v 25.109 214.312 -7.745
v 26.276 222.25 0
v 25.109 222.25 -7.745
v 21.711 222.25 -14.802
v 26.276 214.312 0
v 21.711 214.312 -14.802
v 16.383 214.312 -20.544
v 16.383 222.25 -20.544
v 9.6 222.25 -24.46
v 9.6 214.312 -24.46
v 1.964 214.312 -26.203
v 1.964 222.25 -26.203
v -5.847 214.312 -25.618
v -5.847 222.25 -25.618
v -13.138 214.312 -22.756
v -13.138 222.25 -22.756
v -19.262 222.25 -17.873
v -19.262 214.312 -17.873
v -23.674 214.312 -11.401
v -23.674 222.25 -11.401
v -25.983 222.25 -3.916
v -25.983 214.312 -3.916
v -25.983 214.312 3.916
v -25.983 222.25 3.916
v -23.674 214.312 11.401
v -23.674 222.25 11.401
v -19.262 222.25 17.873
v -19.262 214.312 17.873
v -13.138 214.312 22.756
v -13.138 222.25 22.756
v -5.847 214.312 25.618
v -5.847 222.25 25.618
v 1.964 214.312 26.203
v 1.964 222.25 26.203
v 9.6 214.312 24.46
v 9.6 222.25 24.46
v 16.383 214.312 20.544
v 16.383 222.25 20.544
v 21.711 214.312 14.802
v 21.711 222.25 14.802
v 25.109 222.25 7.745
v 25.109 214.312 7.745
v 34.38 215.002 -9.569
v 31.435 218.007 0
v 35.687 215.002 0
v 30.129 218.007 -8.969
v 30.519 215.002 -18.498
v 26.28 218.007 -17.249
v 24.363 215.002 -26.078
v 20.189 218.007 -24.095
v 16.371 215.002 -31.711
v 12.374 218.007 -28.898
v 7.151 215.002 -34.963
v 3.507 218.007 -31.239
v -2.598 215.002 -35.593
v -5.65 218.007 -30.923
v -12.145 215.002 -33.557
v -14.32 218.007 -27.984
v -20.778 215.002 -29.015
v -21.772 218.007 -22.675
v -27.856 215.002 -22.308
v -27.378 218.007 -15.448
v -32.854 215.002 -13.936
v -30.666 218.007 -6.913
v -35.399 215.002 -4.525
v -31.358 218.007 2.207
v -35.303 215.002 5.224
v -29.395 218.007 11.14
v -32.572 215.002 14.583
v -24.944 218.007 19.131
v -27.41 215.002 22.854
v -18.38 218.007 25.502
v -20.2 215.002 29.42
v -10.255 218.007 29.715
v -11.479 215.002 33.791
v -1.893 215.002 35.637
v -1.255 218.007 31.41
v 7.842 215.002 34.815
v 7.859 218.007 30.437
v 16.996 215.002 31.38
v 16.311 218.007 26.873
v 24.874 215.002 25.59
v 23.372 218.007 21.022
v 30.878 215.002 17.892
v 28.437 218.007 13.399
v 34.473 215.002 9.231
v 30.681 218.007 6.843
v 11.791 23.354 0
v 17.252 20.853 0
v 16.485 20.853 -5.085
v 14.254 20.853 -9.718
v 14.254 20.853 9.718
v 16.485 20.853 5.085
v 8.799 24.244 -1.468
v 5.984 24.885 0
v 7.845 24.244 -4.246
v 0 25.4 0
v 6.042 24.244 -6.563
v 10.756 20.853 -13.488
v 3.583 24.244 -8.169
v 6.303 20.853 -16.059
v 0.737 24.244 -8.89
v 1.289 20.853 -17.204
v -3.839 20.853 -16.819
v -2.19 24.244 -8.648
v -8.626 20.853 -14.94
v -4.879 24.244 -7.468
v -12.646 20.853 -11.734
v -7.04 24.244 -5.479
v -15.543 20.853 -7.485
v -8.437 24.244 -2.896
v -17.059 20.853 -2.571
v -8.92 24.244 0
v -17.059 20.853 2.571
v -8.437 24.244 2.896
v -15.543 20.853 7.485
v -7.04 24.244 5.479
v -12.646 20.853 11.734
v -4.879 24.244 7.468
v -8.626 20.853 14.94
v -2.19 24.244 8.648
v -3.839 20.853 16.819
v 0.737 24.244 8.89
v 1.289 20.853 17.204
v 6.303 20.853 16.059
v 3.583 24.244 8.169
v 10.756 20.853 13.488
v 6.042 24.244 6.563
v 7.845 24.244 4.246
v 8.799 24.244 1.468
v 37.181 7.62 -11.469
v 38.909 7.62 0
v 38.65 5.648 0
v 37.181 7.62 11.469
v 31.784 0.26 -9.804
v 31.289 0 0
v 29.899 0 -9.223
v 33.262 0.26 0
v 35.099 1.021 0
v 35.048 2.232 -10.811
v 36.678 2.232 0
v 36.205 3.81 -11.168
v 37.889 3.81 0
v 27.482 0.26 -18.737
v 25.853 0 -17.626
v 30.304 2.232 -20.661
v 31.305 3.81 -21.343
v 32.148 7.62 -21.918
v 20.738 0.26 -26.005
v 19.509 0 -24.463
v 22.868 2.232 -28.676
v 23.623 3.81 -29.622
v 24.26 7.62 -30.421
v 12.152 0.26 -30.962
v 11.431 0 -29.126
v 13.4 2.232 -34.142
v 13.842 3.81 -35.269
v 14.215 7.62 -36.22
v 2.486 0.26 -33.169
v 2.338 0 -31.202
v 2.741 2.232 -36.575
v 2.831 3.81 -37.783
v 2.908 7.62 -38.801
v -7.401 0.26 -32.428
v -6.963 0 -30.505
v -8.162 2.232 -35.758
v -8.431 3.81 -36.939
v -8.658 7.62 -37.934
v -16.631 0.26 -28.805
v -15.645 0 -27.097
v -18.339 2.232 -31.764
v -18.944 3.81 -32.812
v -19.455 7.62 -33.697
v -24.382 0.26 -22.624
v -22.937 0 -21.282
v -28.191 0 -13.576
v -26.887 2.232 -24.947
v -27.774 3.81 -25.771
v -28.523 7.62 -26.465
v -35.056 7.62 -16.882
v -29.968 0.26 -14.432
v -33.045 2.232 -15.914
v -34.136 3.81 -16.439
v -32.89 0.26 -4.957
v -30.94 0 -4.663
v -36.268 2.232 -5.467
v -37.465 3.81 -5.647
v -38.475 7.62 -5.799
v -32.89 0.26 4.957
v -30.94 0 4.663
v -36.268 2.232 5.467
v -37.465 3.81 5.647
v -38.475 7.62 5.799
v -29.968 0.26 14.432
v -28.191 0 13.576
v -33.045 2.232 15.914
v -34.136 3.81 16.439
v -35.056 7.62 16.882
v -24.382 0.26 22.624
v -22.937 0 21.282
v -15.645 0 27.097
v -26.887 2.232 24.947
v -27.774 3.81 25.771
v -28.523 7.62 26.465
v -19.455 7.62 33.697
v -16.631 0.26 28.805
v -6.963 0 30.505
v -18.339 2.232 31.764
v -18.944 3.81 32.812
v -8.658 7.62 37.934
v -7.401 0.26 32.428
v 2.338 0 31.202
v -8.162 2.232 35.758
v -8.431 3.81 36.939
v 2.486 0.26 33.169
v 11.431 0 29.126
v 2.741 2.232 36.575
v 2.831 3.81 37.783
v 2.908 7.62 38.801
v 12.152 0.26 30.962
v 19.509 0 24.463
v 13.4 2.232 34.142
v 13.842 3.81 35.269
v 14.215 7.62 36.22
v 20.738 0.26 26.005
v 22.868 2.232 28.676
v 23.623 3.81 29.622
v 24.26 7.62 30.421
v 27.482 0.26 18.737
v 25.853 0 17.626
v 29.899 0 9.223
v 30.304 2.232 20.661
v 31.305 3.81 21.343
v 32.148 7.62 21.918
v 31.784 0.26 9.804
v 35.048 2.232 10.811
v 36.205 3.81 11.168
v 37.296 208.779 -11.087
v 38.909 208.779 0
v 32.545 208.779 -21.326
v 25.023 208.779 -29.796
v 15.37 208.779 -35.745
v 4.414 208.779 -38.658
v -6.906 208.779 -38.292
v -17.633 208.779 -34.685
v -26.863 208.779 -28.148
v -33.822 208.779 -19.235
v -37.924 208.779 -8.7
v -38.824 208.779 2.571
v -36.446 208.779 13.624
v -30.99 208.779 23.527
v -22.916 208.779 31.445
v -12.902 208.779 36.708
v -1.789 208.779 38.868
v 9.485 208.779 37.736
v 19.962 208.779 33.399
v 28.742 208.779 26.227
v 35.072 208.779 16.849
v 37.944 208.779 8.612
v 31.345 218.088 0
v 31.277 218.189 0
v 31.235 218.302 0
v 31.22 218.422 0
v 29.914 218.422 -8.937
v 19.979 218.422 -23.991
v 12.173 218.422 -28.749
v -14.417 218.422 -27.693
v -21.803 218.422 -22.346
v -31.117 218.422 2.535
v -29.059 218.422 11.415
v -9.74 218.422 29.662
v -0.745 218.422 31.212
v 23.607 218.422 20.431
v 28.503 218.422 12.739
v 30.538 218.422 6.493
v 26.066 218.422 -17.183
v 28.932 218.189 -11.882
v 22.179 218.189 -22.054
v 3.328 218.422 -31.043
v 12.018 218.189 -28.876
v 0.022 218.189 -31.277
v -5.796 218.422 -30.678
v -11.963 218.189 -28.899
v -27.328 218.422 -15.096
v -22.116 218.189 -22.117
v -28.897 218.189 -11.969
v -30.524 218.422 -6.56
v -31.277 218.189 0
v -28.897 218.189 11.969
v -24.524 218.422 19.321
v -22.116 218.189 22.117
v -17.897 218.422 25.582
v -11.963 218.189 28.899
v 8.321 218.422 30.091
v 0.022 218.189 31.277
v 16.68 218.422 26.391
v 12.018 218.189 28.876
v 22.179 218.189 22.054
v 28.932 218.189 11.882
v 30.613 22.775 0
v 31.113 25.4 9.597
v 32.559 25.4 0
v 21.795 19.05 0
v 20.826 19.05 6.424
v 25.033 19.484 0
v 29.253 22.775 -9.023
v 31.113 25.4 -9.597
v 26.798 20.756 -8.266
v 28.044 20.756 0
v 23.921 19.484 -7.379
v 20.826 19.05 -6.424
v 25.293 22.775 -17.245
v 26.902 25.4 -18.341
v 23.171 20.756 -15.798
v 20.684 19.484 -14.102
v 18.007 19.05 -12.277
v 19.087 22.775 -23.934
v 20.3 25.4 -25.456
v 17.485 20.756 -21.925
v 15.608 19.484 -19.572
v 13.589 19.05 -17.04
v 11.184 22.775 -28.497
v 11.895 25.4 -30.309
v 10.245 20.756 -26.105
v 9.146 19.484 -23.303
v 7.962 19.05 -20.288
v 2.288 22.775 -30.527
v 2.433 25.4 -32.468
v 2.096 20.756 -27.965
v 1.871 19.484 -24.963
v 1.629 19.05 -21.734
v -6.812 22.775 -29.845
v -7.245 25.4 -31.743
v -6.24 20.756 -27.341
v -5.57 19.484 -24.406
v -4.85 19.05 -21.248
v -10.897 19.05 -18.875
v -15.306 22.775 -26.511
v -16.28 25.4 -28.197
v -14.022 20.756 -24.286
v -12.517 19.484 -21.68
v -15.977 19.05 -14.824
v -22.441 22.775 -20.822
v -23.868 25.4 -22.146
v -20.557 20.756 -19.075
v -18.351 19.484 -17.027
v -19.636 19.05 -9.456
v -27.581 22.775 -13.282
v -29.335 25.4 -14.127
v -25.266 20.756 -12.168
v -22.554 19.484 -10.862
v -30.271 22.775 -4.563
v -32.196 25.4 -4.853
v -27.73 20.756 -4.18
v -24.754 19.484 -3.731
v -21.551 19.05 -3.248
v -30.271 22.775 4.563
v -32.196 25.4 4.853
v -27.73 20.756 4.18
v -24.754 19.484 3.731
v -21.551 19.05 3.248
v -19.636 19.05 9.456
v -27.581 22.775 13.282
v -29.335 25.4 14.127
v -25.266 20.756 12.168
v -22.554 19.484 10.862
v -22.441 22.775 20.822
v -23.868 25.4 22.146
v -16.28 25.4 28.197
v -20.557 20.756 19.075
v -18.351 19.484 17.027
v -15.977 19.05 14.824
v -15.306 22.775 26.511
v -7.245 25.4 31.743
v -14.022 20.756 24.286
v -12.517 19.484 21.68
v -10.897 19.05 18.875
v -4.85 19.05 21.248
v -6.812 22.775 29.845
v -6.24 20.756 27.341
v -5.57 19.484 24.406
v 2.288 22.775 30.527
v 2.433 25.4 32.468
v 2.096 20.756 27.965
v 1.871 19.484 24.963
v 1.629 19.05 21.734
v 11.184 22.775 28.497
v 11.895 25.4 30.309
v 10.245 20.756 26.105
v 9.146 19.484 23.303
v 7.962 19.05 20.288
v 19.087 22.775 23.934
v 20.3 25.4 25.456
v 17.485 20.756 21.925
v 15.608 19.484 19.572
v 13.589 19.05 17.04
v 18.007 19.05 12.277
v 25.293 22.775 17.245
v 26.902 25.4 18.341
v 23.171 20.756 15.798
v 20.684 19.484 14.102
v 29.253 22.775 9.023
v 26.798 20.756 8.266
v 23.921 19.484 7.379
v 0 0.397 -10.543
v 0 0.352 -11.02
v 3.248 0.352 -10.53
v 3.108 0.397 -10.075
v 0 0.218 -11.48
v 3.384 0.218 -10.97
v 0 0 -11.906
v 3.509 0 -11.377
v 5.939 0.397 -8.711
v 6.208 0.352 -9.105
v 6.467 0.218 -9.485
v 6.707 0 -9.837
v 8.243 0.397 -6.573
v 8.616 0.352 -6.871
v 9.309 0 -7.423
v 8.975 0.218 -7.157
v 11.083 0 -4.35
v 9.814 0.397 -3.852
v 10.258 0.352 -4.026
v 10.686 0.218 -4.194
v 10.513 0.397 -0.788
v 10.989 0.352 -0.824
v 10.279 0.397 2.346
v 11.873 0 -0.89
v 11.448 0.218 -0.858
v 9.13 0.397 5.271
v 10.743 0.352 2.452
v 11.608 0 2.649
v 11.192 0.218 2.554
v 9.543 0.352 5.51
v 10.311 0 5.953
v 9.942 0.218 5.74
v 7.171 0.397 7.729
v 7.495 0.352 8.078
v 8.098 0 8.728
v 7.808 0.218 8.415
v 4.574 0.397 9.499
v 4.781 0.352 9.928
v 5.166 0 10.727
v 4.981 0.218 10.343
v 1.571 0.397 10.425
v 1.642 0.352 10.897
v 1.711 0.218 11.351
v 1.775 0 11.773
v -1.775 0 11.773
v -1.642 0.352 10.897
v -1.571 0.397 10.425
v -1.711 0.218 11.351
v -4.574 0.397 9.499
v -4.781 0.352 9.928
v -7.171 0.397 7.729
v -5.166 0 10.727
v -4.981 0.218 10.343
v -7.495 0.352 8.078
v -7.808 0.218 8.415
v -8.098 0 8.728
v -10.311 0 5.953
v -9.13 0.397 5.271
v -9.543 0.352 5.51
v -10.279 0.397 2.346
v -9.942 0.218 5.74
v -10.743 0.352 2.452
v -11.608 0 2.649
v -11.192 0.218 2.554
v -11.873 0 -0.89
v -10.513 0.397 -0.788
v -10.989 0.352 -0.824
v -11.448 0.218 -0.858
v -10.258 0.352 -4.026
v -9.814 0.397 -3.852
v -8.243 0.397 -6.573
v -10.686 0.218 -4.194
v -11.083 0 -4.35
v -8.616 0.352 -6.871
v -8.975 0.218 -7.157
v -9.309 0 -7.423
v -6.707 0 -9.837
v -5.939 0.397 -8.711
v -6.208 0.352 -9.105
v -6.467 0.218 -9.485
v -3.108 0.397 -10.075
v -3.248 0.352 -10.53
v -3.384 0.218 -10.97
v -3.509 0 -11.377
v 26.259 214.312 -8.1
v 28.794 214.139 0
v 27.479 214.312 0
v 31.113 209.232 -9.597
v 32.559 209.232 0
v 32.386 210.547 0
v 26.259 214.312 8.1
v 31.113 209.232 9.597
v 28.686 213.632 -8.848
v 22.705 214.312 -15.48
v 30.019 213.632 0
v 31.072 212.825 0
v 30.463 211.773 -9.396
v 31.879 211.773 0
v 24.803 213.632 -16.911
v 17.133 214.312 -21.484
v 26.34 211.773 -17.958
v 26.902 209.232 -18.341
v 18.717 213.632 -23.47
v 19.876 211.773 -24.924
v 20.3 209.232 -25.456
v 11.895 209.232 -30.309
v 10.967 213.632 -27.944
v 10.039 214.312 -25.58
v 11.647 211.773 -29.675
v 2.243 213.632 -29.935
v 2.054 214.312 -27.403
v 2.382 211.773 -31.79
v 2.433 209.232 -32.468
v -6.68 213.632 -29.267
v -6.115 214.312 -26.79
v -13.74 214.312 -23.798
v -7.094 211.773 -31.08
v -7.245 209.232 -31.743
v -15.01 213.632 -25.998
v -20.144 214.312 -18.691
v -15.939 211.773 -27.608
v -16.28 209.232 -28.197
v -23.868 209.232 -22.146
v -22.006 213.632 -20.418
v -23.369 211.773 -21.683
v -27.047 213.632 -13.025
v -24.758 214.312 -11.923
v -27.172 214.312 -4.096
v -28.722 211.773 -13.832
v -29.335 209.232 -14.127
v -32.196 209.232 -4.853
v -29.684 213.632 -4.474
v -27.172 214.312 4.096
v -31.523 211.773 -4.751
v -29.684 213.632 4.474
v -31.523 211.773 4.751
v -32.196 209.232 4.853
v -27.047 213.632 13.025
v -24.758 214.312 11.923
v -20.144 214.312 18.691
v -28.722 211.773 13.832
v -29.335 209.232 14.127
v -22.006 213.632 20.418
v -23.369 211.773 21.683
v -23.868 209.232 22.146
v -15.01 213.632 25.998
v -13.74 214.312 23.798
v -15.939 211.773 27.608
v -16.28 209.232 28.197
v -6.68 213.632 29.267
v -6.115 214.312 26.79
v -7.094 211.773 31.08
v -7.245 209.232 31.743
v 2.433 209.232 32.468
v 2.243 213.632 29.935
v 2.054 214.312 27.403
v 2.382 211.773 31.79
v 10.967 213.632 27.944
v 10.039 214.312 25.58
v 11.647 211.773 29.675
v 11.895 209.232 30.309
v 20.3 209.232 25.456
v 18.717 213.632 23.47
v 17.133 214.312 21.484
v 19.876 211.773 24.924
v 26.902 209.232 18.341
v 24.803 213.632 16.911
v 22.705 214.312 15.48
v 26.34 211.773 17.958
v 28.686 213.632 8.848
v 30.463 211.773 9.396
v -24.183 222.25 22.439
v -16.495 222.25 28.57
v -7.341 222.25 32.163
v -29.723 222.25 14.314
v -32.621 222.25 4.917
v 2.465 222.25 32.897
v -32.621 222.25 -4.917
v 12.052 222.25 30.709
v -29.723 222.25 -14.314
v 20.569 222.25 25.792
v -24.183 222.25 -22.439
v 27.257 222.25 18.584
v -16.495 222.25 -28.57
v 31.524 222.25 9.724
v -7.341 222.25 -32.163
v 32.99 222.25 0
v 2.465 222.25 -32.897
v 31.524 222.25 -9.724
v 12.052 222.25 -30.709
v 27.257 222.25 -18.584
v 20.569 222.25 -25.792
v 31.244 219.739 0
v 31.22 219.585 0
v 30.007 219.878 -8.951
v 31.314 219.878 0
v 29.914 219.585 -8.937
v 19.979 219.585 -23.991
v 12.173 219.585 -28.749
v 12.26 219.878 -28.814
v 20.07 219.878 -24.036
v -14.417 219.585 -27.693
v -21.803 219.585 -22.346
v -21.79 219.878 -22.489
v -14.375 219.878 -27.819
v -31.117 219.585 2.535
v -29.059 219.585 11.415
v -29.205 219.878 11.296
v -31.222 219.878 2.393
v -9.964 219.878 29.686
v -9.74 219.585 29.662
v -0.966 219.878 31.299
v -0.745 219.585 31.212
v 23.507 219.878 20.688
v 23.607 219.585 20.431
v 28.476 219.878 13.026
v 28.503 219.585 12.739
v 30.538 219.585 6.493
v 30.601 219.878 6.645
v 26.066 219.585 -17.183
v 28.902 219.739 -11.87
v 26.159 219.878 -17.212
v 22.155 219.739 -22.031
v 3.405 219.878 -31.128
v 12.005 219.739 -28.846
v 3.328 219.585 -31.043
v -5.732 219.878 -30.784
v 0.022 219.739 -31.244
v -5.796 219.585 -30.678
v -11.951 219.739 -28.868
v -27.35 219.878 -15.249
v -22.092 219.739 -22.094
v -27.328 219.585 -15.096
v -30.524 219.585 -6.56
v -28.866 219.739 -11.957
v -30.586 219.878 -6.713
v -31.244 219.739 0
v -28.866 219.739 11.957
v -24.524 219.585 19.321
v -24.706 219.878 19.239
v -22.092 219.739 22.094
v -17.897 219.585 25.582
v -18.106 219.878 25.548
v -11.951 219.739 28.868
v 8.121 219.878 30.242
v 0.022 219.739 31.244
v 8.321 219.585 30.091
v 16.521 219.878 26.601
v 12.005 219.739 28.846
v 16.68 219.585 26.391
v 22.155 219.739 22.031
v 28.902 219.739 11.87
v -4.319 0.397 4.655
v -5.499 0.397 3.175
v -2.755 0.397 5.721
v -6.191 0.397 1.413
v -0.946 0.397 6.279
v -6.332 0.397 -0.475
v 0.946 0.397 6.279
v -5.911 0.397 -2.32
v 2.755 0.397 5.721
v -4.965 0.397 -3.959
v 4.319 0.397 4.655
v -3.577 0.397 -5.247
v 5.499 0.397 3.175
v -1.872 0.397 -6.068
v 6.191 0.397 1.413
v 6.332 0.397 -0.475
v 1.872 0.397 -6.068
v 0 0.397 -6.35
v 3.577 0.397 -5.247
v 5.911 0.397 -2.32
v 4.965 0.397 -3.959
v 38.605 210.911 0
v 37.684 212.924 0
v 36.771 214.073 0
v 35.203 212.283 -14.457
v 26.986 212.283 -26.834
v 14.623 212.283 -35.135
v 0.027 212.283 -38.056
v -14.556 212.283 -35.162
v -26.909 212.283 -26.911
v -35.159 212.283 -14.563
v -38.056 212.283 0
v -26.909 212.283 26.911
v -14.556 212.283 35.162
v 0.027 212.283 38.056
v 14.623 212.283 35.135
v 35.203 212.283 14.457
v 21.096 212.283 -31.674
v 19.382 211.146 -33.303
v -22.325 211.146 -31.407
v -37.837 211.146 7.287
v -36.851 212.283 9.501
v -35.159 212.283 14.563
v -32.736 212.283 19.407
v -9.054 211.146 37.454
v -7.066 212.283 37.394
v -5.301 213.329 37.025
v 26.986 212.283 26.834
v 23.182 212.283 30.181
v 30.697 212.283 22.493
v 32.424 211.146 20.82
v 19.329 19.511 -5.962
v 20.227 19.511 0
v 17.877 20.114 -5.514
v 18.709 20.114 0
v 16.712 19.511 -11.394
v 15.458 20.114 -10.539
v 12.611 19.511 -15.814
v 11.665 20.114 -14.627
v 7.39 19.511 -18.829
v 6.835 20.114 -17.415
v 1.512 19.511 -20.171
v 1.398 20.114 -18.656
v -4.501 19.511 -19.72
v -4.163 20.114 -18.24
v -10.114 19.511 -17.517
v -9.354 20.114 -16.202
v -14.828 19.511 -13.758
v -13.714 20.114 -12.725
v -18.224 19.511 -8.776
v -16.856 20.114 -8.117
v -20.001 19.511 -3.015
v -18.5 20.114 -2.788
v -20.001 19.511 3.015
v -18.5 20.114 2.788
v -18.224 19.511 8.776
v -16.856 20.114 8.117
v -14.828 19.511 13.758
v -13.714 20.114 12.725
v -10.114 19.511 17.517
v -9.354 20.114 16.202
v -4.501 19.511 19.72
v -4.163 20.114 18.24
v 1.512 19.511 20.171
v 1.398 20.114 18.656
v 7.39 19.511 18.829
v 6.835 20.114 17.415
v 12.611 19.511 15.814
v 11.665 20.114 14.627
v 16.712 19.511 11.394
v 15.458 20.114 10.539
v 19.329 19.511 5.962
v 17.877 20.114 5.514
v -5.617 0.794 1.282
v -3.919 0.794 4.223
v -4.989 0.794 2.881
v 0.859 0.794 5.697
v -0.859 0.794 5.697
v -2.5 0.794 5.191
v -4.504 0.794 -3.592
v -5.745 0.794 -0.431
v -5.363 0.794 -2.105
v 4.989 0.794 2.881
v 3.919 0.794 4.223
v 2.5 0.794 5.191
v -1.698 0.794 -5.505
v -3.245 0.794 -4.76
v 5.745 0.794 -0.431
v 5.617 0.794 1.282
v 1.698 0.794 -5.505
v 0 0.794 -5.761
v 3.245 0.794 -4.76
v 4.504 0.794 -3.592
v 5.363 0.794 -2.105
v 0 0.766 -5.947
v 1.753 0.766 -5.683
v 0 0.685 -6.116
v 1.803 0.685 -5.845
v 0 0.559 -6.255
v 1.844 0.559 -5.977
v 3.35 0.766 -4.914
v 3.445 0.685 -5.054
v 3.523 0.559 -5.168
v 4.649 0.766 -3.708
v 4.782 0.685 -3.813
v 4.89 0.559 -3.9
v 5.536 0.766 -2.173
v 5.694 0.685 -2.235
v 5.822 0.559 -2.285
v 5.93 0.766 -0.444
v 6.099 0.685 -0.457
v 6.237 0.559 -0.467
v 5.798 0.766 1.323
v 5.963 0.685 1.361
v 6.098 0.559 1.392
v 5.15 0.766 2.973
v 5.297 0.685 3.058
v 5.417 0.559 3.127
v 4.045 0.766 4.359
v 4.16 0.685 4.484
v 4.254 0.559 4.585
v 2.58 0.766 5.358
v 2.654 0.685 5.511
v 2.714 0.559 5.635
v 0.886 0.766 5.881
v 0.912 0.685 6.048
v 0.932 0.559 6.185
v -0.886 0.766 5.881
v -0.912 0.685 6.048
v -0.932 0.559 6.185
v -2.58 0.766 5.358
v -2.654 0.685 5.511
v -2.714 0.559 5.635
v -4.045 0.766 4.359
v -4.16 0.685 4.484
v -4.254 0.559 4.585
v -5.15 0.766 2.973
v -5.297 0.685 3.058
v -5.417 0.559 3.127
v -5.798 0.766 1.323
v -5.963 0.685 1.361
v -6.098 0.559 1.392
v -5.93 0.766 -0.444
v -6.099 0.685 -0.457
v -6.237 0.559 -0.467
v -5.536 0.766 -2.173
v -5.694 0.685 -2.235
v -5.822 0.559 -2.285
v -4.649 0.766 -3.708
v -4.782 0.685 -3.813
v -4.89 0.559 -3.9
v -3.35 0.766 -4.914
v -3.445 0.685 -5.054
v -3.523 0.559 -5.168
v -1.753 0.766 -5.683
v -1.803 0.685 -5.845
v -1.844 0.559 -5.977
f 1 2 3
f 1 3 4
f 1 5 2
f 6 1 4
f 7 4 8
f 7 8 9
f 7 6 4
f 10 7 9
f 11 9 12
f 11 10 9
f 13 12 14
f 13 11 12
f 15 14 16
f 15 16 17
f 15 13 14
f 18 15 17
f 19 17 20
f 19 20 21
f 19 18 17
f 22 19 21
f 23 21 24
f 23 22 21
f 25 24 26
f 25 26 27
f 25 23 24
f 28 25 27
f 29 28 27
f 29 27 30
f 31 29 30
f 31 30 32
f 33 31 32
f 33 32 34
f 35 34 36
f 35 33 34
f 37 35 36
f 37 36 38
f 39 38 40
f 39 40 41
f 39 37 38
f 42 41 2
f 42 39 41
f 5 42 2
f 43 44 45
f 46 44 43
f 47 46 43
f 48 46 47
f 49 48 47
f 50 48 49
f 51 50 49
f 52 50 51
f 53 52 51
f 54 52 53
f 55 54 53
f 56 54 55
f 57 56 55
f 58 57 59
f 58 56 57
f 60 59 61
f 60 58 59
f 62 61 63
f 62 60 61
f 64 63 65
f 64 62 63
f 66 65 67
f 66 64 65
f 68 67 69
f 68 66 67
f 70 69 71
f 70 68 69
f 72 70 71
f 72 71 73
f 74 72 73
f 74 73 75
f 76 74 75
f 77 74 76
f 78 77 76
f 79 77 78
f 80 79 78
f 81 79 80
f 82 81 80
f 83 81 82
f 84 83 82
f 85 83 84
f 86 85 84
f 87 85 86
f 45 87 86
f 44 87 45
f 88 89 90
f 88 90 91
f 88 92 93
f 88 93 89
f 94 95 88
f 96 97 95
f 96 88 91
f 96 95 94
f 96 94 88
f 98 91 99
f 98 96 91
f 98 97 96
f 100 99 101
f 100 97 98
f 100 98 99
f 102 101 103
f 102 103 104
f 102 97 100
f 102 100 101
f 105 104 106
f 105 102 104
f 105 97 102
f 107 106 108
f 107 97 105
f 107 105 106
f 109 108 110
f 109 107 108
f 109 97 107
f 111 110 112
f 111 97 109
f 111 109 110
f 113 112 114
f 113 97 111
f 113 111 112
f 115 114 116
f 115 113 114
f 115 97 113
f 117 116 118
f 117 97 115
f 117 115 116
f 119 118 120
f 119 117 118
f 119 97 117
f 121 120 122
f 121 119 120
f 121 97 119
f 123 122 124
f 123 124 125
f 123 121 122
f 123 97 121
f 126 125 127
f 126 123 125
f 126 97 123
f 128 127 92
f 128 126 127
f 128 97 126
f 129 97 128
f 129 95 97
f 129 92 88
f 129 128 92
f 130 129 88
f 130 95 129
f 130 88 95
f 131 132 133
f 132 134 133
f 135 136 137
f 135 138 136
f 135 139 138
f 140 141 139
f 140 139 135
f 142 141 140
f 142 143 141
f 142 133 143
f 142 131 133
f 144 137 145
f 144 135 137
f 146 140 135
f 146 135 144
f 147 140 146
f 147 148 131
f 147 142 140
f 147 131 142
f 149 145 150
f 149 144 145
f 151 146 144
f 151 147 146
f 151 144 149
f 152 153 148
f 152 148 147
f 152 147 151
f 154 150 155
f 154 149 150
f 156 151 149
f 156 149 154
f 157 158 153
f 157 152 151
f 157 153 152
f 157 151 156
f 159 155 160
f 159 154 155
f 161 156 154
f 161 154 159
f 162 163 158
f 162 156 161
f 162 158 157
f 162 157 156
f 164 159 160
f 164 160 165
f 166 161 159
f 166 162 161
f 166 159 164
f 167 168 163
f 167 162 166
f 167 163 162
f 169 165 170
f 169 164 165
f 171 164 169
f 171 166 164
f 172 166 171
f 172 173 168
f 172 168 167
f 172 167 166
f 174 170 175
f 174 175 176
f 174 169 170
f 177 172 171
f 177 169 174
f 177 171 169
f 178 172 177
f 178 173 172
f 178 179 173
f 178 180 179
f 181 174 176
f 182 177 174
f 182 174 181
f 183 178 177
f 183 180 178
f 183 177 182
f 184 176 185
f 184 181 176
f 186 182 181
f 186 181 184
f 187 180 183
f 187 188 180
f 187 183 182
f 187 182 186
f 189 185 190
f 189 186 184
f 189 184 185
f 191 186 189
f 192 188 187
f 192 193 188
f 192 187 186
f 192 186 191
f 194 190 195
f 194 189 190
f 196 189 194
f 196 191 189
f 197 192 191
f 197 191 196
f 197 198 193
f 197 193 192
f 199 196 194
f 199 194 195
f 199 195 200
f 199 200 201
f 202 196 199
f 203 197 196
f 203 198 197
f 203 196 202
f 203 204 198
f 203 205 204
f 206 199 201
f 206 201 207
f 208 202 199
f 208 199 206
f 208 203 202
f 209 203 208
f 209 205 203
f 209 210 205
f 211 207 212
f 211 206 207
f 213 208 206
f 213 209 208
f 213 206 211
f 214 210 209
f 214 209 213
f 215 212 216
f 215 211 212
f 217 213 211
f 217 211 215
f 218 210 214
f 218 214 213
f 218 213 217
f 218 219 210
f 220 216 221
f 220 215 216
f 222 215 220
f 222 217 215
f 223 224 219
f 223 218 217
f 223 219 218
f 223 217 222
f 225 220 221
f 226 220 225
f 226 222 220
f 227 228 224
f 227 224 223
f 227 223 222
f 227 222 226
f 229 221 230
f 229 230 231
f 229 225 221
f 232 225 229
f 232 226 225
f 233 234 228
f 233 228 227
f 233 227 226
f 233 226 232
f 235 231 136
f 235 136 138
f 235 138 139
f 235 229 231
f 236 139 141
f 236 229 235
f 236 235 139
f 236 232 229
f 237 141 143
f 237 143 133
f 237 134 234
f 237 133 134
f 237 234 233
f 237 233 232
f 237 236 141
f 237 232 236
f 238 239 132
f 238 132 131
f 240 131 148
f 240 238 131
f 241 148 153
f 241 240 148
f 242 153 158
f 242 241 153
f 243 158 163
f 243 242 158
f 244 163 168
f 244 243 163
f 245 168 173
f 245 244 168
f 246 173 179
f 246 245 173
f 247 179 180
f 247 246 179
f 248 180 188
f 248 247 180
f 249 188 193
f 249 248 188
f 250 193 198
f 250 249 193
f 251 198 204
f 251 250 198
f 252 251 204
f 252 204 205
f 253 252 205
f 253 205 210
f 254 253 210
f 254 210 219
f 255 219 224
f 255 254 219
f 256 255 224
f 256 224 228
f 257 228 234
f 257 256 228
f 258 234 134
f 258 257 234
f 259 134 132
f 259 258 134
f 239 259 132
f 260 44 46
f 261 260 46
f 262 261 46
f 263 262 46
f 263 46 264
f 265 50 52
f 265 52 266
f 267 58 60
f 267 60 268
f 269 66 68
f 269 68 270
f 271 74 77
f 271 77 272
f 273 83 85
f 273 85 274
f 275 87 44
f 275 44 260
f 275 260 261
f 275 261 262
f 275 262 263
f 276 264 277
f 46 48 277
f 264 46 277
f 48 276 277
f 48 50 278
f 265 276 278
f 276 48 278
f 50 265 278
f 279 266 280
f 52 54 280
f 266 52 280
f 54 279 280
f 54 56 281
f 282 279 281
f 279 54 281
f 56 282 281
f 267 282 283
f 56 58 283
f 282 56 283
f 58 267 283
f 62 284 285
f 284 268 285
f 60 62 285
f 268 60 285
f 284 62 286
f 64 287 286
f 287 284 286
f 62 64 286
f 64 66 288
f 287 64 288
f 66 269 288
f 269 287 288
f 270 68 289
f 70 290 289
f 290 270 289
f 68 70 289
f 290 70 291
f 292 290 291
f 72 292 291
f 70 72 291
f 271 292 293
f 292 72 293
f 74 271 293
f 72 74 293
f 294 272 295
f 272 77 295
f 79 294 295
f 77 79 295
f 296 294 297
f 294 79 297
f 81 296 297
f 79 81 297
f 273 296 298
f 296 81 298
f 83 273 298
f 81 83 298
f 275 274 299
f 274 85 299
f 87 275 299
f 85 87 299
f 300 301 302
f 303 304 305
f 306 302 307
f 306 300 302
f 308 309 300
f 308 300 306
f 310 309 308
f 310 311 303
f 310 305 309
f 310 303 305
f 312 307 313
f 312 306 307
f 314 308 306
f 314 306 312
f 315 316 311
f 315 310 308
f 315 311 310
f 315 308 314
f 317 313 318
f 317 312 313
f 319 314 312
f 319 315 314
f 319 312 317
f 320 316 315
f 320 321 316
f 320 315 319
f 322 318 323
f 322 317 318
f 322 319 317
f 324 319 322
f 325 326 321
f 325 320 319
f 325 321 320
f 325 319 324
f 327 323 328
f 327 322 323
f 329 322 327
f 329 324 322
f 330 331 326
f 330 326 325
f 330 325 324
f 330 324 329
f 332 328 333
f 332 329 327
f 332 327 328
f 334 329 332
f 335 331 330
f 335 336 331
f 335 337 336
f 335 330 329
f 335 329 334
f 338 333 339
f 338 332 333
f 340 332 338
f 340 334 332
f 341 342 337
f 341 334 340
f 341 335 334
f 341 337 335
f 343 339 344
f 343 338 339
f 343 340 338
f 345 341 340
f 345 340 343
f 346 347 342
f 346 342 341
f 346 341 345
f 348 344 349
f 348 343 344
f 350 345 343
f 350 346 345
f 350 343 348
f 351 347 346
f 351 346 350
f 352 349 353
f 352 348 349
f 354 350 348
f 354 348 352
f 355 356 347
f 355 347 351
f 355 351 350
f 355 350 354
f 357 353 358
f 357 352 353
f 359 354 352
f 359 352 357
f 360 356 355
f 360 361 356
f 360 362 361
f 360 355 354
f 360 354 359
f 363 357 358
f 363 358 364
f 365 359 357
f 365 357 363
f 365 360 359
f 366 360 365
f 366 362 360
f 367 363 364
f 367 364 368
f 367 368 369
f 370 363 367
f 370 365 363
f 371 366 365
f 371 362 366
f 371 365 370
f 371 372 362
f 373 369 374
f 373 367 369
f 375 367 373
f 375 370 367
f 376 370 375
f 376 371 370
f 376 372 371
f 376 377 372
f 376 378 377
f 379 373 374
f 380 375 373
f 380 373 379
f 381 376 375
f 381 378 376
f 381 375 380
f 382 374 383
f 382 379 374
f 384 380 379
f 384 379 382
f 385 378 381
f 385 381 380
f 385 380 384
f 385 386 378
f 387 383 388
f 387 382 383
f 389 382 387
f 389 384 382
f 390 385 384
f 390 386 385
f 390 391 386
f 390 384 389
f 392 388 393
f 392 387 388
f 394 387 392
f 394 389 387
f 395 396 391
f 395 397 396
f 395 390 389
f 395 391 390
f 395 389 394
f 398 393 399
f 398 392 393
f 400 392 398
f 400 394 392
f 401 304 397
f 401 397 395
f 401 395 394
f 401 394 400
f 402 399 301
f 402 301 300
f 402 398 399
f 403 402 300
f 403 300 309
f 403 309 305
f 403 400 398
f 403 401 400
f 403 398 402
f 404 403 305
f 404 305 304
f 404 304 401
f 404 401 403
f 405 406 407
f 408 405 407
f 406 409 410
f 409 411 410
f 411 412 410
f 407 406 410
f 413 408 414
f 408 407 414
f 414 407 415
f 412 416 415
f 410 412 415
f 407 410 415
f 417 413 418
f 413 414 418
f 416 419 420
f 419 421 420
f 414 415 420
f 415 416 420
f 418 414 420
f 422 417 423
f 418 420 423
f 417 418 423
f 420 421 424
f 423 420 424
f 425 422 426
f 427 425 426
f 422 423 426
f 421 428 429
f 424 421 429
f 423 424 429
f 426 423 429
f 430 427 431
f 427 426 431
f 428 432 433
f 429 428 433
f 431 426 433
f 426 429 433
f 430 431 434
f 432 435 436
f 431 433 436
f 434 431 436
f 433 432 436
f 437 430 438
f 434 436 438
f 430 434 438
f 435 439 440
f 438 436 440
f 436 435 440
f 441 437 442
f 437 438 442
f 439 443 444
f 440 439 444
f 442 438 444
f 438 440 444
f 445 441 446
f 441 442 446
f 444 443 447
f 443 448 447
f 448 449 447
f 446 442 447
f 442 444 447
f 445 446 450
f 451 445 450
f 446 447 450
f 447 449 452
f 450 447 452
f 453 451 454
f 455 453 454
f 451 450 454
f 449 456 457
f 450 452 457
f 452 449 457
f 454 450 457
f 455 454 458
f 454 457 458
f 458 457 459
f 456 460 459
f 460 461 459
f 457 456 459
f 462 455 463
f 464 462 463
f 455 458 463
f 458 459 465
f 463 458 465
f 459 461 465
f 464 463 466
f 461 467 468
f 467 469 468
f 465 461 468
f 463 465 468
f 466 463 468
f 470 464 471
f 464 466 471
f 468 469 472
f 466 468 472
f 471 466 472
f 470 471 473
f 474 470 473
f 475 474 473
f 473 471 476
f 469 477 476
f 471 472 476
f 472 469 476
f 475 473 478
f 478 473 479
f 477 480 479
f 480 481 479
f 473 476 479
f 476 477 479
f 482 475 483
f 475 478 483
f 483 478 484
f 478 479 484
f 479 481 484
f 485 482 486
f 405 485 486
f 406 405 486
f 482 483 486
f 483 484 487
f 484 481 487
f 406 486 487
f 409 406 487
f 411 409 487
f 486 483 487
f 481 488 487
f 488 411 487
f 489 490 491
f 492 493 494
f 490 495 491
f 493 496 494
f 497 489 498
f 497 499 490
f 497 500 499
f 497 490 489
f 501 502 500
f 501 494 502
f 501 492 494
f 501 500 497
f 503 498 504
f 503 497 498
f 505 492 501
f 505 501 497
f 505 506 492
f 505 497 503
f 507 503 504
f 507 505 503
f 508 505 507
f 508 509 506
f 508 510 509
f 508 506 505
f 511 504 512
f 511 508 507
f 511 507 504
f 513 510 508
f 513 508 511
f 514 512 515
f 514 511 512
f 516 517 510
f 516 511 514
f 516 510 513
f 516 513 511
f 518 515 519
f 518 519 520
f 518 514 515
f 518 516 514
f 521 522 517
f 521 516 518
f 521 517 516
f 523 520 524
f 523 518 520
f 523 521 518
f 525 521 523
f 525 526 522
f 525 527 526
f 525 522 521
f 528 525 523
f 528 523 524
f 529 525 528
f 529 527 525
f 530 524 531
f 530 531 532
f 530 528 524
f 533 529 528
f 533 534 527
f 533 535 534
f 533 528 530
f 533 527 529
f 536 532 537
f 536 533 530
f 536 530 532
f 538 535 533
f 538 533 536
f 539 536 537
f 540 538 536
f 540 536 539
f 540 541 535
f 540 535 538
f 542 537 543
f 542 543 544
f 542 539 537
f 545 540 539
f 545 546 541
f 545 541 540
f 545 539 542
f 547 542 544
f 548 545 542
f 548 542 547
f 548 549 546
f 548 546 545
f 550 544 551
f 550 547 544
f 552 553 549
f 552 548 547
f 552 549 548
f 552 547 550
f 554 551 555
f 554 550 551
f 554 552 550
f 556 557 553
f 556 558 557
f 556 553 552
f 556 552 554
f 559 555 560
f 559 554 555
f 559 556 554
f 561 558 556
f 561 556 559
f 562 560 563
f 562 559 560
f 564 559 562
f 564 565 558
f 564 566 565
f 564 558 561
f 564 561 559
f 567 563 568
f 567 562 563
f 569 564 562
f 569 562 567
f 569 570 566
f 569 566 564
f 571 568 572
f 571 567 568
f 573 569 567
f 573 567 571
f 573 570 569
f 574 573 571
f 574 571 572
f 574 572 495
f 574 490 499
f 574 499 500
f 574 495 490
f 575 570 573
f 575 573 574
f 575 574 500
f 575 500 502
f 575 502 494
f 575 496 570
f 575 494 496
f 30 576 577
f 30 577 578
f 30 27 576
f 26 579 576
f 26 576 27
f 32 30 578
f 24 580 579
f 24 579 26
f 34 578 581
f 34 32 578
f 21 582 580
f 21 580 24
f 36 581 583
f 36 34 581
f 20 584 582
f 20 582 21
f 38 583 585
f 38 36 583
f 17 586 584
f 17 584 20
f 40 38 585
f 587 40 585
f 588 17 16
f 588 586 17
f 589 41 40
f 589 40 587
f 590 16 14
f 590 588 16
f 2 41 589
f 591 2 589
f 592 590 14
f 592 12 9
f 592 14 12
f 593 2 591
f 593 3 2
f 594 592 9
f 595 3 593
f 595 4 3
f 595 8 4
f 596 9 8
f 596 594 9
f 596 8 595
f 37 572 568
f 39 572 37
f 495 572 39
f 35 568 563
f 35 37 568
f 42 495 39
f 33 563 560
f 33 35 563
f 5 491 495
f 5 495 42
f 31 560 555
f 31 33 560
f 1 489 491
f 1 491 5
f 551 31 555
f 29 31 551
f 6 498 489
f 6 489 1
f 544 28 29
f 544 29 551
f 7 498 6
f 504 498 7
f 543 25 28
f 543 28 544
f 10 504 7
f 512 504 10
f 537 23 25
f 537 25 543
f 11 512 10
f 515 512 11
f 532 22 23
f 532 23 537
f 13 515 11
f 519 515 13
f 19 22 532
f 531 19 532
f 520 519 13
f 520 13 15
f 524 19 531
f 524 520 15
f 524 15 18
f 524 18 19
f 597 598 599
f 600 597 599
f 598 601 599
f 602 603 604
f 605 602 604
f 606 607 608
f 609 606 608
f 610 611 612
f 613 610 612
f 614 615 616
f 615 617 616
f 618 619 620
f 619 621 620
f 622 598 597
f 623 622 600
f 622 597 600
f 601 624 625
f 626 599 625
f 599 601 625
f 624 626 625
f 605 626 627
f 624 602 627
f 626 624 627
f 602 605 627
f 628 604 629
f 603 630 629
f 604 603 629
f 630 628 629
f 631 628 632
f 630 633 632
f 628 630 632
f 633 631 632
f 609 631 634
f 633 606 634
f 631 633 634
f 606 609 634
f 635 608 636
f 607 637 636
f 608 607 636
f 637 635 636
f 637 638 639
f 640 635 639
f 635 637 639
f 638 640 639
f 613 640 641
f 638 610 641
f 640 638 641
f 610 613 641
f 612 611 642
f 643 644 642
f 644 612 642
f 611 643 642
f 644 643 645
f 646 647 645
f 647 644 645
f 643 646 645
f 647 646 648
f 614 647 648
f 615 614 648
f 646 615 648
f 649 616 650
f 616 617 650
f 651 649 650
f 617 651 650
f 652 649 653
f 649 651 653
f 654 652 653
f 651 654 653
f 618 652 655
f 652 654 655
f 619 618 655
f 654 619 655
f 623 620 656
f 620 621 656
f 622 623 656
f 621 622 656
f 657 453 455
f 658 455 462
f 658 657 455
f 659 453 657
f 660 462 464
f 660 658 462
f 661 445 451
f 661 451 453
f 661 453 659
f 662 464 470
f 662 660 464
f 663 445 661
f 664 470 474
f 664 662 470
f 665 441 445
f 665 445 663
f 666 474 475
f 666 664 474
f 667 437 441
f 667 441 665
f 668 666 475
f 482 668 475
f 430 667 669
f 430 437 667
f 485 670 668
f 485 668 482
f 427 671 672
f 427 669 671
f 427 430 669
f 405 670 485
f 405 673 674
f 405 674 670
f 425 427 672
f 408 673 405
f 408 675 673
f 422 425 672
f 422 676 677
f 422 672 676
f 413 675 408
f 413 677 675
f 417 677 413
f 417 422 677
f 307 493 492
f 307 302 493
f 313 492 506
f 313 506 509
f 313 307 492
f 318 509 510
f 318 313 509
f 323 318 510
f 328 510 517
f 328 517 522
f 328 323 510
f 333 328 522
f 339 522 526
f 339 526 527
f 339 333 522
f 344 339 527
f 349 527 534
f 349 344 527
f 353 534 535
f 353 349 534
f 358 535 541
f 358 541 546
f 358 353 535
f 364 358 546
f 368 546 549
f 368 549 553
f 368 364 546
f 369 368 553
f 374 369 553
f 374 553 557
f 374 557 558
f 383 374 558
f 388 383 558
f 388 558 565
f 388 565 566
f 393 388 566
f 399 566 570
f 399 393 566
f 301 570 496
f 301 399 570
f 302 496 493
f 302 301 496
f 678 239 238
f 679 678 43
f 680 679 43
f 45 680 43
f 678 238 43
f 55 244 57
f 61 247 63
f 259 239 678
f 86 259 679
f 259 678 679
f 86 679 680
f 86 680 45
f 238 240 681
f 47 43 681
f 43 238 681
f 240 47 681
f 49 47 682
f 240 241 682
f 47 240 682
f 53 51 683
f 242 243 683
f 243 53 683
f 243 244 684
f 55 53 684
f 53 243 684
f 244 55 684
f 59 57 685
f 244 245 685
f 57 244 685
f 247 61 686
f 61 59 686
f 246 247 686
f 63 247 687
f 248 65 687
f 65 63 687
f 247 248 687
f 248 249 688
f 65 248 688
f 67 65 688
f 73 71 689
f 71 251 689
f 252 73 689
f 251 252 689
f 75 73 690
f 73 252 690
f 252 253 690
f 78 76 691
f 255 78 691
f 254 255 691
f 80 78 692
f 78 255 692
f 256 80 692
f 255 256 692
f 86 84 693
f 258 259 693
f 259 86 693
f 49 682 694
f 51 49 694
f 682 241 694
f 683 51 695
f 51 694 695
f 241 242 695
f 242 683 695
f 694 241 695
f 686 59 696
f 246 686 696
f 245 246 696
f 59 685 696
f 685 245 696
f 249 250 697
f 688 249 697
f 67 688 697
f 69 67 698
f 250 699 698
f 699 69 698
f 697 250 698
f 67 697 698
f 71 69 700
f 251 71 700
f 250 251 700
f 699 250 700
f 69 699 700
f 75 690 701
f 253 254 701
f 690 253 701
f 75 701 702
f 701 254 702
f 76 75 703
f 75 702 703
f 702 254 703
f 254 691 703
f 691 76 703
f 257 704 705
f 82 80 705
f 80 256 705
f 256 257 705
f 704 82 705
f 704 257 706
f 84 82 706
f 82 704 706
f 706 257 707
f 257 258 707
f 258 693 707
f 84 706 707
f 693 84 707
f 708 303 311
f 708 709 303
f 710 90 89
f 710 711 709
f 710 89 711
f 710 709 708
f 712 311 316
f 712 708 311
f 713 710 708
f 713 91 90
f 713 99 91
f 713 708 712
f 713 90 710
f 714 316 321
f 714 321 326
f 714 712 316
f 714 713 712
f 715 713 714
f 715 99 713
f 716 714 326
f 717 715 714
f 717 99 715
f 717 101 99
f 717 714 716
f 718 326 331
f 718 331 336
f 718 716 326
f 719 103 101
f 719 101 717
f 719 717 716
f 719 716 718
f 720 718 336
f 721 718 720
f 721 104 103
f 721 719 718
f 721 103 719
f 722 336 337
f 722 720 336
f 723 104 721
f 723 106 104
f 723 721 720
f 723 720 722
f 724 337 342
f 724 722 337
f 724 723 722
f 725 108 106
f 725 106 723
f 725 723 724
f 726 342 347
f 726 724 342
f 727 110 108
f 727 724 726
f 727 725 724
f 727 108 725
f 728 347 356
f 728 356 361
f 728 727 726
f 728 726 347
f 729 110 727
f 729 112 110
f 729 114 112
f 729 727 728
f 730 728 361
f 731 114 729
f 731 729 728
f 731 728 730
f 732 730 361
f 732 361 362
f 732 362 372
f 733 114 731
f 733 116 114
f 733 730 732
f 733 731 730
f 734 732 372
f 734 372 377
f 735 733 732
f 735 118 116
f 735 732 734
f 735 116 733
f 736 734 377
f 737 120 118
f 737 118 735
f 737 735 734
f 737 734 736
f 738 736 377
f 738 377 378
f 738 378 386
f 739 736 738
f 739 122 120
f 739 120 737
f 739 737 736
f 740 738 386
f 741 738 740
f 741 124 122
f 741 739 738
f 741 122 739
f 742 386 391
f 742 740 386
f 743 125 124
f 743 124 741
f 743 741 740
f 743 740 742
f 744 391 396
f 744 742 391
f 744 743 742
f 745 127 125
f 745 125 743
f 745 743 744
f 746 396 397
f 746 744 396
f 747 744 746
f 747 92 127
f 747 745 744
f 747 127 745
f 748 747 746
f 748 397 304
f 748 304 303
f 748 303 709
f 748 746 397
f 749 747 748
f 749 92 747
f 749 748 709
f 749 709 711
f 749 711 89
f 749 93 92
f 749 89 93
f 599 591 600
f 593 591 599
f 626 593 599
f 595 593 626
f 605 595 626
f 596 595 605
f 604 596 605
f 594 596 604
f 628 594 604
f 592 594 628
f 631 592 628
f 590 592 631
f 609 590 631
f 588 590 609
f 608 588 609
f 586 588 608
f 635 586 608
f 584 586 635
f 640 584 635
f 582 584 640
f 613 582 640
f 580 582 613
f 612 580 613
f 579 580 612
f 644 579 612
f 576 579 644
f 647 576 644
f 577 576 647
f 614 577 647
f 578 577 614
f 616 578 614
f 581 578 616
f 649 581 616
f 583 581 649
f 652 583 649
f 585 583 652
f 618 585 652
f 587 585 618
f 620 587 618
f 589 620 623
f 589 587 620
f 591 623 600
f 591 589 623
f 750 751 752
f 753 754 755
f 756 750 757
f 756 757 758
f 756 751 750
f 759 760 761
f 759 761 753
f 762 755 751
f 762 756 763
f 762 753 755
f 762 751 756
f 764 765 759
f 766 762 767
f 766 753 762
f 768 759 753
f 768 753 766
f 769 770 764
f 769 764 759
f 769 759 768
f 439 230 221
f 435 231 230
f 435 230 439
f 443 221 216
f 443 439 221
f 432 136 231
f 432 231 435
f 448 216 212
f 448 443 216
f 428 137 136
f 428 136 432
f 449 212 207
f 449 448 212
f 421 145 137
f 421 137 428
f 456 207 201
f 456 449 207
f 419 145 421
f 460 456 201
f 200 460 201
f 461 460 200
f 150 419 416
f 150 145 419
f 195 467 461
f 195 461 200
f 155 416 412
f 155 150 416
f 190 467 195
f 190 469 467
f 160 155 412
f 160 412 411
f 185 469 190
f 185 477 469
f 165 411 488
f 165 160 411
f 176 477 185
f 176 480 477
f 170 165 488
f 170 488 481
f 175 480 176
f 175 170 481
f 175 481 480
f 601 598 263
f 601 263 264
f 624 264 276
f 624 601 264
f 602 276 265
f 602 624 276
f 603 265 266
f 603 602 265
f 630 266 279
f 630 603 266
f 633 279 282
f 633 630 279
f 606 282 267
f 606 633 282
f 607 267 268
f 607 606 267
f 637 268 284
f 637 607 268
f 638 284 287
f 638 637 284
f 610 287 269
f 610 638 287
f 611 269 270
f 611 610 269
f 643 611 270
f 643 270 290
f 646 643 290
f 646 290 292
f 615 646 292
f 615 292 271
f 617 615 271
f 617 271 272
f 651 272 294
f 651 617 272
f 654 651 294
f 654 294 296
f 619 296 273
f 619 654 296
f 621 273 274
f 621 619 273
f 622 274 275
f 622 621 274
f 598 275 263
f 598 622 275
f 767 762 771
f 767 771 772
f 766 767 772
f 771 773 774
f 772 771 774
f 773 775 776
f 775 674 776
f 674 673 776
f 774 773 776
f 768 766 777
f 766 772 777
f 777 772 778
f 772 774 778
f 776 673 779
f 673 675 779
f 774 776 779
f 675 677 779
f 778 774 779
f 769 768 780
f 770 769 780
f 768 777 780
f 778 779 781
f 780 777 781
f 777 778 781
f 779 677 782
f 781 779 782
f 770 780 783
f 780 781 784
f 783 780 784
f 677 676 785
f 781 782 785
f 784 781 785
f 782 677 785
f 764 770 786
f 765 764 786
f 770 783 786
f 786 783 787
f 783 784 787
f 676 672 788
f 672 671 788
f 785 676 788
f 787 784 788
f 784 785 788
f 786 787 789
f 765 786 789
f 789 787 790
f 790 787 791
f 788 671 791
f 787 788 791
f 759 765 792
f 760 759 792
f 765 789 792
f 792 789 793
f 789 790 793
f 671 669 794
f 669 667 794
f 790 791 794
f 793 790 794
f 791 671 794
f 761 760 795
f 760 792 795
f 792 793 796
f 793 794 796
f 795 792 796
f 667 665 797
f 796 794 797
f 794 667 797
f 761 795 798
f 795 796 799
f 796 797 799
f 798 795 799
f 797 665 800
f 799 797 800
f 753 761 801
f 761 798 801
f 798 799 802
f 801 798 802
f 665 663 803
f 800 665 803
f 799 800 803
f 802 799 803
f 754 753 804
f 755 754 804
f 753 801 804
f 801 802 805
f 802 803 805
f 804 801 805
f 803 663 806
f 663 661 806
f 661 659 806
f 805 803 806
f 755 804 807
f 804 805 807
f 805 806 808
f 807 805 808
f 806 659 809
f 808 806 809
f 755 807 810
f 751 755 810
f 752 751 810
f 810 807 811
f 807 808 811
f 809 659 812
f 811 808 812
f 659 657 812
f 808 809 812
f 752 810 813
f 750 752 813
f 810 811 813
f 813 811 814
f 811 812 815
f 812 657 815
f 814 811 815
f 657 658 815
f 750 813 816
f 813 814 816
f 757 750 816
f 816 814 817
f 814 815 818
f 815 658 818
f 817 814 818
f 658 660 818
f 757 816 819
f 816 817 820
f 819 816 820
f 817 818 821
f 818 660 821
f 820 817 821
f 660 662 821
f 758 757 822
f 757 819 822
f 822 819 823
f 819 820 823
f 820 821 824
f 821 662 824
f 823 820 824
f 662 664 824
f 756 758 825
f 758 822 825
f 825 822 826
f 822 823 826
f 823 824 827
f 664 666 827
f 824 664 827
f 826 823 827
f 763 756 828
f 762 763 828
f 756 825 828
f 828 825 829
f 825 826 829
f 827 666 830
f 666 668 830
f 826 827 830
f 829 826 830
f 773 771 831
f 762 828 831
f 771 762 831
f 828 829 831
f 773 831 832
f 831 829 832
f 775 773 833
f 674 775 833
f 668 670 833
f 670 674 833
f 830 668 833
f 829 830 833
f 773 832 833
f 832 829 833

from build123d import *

# Parameters (mm, degrees)
FILLET3_R          = 7.62
FILLET7_R          = 0.508
SKETCH8_R          = 11.90625
CUT_EXTRUDE1_DEPTH = 0.396875
FILLET1_R          = 2.54
SKETCH9_R          = 6.35
CUT_EXTRUDE2_DEPTH = 0.396875
FILLET2_R          = 0.635


# Read off the part's stored shape, not the designer's step: Revolve1
with BuildPart() as part:
    # Revolve1 outline → Revolve1 (revolve)
    with BuildSketch(Plane.XY):
        with BuildLine():
            Line((0, 25.4), (0, 0))
            Line((0, 0), (31.289404712, 0))
            ThreePointArc((31.289404712, 0), (36.677558385, 2.231846327), (38.909404712, 7.62))
            Line((38.909404712, 7.62), (38.909404712, 212.725))
            Line((38.909404712, 212.725), (31.220472144, 218.159183173))
            Line((31.220472144, 218.159183173), (31.220472144, 219.746683173))
            Line((31.220472144, 219.746683173), (32.989701104, 222.25))
            Line((32.989701104, 222.25), (26.276481104, 222.25))
            Line((26.276481104, 222.25), (26.276481104, 214.3125))
            Line((26.276481104, 214.3125), (27.479404712, 214.3125))
            ThreePointArc((27.479404712, 214.3125), (31.071507161, 212.824602449), (32.559404712, 209.2325))
            Line((32.559404712, 209.2325), (32.559404712, 25.4))
            ThreePointArc((32.559404712, 25.4), (28.043634012, 20.755784366), (21.794536191, 19.05))
            ThreePointArc((21.794536191, 19.05), (19.461011381, 19.794876886), (17.251746885, 20.852860816))
            ThreePointArc((17.251746885, 20.852860816), (8.920471492, 24.244128913), (0, 25.4))
        make_face()
    revolve(axis=Axis((0, 0, 0), (0, 1, 0)))

    # Fillet3
    fillet3_edges = [part.edges().sort_by_distance(p)[0] for p in [
        (-38.909404712, 212.725, 0),
    ]]
    fillet(fillet3_edges, radius=FILLET3_R)

    # Fillet7
    fillet7_edges = [part.edges().sort_by_distance(p)[0] for p in [
        (-31.220472144, 219.746683173, 0),
        (-31.220472144, 218.159183173, 0),
    ]]
    fillet(fillet7_edges, radius=FILLET7_R)

    # Sketch8 → Cut-Extrude1 (cut)
    with BuildSketch(Plane.XZ):
        with Locations(Location((0, 0, 0), (0, 0, 270))):
            Circle(SKETCH8_R)
    extrude(amount=-CUT_EXTRUDE1_DEPTH, mode=Mode.SUBTRACT)

    # Fillet1
    # the kernel refuses this fillet: 2.54 mm, written as the material it adds along each edge
    with BuildSketch(Plane(origin=(0, 0.396875, 0), x_dir=(0, 0, -1), z_dir=(-1, 0, 0))) as fillet1_piece_1:
        with BuildLine():
            CenterArc((10.542939605, 2.54), FILLET1_R, 270, 32.461744967)
            Line((10.542939605, 0), (10.542939605, -0.0508))
            Line((10.542939605, -0.0508), (11.90625, -0.0508))
            Line((11.90625, -0.0508), (11.95705, 0))
            ThreePointArc((11.95705, 0), (11.95705, 0.1984375), (11.933516208, 0.3540125))
            Line((11.933516208, 0.3540125), (11.90625, 0.396875))
        make_face()
    revolve(axis=Axis((0, 0.396875, 0), (0, -1, 0)))

    # Sketch9 → Cut-Extrude2 (cut)
    with BuildSketch(Plane.XZ.offset(-0.396875)):
        with Locations(Location((0, 0, 0), (0, 0, 270))):
            Circle(SKETCH9_R)
    extrude(amount=-CUT_EXTRUDE2_DEPTH, mode=Mode.SUBTRACT)

    # Fillet2
    # the kernel refuses this fillet: 0.635 mm, written as the material it adds along each edge
    with BuildSketch(Plane(origin=(0, 0.79375, 0), x_dir=(0, 0, -1), z_dir=(-1, 0, 0))) as fillet2_piece_1:
        with BuildLine():
            CenterArc((5.761339245, 0.635), FILLET2_R, 270, 67.975687163)
            Line((5.761339245, 0), (5.761339245, -0.0127))
            Line((5.761339245, -0.0127), (6.35, -0.0127))
            Line((6.35, -0.0127), (6.3627, 0))
            ThreePointArc((6.3627, 0), (6.3627, 0.1984375), (6.361773215, 0.3921125))
            Line((6.361773215, 0.3921125), (6.35, 0.396875))
        make_face()
    revolve(axis=Axis((0, 0.79375, 0), (0, -1, 0)))


solid = part.part
